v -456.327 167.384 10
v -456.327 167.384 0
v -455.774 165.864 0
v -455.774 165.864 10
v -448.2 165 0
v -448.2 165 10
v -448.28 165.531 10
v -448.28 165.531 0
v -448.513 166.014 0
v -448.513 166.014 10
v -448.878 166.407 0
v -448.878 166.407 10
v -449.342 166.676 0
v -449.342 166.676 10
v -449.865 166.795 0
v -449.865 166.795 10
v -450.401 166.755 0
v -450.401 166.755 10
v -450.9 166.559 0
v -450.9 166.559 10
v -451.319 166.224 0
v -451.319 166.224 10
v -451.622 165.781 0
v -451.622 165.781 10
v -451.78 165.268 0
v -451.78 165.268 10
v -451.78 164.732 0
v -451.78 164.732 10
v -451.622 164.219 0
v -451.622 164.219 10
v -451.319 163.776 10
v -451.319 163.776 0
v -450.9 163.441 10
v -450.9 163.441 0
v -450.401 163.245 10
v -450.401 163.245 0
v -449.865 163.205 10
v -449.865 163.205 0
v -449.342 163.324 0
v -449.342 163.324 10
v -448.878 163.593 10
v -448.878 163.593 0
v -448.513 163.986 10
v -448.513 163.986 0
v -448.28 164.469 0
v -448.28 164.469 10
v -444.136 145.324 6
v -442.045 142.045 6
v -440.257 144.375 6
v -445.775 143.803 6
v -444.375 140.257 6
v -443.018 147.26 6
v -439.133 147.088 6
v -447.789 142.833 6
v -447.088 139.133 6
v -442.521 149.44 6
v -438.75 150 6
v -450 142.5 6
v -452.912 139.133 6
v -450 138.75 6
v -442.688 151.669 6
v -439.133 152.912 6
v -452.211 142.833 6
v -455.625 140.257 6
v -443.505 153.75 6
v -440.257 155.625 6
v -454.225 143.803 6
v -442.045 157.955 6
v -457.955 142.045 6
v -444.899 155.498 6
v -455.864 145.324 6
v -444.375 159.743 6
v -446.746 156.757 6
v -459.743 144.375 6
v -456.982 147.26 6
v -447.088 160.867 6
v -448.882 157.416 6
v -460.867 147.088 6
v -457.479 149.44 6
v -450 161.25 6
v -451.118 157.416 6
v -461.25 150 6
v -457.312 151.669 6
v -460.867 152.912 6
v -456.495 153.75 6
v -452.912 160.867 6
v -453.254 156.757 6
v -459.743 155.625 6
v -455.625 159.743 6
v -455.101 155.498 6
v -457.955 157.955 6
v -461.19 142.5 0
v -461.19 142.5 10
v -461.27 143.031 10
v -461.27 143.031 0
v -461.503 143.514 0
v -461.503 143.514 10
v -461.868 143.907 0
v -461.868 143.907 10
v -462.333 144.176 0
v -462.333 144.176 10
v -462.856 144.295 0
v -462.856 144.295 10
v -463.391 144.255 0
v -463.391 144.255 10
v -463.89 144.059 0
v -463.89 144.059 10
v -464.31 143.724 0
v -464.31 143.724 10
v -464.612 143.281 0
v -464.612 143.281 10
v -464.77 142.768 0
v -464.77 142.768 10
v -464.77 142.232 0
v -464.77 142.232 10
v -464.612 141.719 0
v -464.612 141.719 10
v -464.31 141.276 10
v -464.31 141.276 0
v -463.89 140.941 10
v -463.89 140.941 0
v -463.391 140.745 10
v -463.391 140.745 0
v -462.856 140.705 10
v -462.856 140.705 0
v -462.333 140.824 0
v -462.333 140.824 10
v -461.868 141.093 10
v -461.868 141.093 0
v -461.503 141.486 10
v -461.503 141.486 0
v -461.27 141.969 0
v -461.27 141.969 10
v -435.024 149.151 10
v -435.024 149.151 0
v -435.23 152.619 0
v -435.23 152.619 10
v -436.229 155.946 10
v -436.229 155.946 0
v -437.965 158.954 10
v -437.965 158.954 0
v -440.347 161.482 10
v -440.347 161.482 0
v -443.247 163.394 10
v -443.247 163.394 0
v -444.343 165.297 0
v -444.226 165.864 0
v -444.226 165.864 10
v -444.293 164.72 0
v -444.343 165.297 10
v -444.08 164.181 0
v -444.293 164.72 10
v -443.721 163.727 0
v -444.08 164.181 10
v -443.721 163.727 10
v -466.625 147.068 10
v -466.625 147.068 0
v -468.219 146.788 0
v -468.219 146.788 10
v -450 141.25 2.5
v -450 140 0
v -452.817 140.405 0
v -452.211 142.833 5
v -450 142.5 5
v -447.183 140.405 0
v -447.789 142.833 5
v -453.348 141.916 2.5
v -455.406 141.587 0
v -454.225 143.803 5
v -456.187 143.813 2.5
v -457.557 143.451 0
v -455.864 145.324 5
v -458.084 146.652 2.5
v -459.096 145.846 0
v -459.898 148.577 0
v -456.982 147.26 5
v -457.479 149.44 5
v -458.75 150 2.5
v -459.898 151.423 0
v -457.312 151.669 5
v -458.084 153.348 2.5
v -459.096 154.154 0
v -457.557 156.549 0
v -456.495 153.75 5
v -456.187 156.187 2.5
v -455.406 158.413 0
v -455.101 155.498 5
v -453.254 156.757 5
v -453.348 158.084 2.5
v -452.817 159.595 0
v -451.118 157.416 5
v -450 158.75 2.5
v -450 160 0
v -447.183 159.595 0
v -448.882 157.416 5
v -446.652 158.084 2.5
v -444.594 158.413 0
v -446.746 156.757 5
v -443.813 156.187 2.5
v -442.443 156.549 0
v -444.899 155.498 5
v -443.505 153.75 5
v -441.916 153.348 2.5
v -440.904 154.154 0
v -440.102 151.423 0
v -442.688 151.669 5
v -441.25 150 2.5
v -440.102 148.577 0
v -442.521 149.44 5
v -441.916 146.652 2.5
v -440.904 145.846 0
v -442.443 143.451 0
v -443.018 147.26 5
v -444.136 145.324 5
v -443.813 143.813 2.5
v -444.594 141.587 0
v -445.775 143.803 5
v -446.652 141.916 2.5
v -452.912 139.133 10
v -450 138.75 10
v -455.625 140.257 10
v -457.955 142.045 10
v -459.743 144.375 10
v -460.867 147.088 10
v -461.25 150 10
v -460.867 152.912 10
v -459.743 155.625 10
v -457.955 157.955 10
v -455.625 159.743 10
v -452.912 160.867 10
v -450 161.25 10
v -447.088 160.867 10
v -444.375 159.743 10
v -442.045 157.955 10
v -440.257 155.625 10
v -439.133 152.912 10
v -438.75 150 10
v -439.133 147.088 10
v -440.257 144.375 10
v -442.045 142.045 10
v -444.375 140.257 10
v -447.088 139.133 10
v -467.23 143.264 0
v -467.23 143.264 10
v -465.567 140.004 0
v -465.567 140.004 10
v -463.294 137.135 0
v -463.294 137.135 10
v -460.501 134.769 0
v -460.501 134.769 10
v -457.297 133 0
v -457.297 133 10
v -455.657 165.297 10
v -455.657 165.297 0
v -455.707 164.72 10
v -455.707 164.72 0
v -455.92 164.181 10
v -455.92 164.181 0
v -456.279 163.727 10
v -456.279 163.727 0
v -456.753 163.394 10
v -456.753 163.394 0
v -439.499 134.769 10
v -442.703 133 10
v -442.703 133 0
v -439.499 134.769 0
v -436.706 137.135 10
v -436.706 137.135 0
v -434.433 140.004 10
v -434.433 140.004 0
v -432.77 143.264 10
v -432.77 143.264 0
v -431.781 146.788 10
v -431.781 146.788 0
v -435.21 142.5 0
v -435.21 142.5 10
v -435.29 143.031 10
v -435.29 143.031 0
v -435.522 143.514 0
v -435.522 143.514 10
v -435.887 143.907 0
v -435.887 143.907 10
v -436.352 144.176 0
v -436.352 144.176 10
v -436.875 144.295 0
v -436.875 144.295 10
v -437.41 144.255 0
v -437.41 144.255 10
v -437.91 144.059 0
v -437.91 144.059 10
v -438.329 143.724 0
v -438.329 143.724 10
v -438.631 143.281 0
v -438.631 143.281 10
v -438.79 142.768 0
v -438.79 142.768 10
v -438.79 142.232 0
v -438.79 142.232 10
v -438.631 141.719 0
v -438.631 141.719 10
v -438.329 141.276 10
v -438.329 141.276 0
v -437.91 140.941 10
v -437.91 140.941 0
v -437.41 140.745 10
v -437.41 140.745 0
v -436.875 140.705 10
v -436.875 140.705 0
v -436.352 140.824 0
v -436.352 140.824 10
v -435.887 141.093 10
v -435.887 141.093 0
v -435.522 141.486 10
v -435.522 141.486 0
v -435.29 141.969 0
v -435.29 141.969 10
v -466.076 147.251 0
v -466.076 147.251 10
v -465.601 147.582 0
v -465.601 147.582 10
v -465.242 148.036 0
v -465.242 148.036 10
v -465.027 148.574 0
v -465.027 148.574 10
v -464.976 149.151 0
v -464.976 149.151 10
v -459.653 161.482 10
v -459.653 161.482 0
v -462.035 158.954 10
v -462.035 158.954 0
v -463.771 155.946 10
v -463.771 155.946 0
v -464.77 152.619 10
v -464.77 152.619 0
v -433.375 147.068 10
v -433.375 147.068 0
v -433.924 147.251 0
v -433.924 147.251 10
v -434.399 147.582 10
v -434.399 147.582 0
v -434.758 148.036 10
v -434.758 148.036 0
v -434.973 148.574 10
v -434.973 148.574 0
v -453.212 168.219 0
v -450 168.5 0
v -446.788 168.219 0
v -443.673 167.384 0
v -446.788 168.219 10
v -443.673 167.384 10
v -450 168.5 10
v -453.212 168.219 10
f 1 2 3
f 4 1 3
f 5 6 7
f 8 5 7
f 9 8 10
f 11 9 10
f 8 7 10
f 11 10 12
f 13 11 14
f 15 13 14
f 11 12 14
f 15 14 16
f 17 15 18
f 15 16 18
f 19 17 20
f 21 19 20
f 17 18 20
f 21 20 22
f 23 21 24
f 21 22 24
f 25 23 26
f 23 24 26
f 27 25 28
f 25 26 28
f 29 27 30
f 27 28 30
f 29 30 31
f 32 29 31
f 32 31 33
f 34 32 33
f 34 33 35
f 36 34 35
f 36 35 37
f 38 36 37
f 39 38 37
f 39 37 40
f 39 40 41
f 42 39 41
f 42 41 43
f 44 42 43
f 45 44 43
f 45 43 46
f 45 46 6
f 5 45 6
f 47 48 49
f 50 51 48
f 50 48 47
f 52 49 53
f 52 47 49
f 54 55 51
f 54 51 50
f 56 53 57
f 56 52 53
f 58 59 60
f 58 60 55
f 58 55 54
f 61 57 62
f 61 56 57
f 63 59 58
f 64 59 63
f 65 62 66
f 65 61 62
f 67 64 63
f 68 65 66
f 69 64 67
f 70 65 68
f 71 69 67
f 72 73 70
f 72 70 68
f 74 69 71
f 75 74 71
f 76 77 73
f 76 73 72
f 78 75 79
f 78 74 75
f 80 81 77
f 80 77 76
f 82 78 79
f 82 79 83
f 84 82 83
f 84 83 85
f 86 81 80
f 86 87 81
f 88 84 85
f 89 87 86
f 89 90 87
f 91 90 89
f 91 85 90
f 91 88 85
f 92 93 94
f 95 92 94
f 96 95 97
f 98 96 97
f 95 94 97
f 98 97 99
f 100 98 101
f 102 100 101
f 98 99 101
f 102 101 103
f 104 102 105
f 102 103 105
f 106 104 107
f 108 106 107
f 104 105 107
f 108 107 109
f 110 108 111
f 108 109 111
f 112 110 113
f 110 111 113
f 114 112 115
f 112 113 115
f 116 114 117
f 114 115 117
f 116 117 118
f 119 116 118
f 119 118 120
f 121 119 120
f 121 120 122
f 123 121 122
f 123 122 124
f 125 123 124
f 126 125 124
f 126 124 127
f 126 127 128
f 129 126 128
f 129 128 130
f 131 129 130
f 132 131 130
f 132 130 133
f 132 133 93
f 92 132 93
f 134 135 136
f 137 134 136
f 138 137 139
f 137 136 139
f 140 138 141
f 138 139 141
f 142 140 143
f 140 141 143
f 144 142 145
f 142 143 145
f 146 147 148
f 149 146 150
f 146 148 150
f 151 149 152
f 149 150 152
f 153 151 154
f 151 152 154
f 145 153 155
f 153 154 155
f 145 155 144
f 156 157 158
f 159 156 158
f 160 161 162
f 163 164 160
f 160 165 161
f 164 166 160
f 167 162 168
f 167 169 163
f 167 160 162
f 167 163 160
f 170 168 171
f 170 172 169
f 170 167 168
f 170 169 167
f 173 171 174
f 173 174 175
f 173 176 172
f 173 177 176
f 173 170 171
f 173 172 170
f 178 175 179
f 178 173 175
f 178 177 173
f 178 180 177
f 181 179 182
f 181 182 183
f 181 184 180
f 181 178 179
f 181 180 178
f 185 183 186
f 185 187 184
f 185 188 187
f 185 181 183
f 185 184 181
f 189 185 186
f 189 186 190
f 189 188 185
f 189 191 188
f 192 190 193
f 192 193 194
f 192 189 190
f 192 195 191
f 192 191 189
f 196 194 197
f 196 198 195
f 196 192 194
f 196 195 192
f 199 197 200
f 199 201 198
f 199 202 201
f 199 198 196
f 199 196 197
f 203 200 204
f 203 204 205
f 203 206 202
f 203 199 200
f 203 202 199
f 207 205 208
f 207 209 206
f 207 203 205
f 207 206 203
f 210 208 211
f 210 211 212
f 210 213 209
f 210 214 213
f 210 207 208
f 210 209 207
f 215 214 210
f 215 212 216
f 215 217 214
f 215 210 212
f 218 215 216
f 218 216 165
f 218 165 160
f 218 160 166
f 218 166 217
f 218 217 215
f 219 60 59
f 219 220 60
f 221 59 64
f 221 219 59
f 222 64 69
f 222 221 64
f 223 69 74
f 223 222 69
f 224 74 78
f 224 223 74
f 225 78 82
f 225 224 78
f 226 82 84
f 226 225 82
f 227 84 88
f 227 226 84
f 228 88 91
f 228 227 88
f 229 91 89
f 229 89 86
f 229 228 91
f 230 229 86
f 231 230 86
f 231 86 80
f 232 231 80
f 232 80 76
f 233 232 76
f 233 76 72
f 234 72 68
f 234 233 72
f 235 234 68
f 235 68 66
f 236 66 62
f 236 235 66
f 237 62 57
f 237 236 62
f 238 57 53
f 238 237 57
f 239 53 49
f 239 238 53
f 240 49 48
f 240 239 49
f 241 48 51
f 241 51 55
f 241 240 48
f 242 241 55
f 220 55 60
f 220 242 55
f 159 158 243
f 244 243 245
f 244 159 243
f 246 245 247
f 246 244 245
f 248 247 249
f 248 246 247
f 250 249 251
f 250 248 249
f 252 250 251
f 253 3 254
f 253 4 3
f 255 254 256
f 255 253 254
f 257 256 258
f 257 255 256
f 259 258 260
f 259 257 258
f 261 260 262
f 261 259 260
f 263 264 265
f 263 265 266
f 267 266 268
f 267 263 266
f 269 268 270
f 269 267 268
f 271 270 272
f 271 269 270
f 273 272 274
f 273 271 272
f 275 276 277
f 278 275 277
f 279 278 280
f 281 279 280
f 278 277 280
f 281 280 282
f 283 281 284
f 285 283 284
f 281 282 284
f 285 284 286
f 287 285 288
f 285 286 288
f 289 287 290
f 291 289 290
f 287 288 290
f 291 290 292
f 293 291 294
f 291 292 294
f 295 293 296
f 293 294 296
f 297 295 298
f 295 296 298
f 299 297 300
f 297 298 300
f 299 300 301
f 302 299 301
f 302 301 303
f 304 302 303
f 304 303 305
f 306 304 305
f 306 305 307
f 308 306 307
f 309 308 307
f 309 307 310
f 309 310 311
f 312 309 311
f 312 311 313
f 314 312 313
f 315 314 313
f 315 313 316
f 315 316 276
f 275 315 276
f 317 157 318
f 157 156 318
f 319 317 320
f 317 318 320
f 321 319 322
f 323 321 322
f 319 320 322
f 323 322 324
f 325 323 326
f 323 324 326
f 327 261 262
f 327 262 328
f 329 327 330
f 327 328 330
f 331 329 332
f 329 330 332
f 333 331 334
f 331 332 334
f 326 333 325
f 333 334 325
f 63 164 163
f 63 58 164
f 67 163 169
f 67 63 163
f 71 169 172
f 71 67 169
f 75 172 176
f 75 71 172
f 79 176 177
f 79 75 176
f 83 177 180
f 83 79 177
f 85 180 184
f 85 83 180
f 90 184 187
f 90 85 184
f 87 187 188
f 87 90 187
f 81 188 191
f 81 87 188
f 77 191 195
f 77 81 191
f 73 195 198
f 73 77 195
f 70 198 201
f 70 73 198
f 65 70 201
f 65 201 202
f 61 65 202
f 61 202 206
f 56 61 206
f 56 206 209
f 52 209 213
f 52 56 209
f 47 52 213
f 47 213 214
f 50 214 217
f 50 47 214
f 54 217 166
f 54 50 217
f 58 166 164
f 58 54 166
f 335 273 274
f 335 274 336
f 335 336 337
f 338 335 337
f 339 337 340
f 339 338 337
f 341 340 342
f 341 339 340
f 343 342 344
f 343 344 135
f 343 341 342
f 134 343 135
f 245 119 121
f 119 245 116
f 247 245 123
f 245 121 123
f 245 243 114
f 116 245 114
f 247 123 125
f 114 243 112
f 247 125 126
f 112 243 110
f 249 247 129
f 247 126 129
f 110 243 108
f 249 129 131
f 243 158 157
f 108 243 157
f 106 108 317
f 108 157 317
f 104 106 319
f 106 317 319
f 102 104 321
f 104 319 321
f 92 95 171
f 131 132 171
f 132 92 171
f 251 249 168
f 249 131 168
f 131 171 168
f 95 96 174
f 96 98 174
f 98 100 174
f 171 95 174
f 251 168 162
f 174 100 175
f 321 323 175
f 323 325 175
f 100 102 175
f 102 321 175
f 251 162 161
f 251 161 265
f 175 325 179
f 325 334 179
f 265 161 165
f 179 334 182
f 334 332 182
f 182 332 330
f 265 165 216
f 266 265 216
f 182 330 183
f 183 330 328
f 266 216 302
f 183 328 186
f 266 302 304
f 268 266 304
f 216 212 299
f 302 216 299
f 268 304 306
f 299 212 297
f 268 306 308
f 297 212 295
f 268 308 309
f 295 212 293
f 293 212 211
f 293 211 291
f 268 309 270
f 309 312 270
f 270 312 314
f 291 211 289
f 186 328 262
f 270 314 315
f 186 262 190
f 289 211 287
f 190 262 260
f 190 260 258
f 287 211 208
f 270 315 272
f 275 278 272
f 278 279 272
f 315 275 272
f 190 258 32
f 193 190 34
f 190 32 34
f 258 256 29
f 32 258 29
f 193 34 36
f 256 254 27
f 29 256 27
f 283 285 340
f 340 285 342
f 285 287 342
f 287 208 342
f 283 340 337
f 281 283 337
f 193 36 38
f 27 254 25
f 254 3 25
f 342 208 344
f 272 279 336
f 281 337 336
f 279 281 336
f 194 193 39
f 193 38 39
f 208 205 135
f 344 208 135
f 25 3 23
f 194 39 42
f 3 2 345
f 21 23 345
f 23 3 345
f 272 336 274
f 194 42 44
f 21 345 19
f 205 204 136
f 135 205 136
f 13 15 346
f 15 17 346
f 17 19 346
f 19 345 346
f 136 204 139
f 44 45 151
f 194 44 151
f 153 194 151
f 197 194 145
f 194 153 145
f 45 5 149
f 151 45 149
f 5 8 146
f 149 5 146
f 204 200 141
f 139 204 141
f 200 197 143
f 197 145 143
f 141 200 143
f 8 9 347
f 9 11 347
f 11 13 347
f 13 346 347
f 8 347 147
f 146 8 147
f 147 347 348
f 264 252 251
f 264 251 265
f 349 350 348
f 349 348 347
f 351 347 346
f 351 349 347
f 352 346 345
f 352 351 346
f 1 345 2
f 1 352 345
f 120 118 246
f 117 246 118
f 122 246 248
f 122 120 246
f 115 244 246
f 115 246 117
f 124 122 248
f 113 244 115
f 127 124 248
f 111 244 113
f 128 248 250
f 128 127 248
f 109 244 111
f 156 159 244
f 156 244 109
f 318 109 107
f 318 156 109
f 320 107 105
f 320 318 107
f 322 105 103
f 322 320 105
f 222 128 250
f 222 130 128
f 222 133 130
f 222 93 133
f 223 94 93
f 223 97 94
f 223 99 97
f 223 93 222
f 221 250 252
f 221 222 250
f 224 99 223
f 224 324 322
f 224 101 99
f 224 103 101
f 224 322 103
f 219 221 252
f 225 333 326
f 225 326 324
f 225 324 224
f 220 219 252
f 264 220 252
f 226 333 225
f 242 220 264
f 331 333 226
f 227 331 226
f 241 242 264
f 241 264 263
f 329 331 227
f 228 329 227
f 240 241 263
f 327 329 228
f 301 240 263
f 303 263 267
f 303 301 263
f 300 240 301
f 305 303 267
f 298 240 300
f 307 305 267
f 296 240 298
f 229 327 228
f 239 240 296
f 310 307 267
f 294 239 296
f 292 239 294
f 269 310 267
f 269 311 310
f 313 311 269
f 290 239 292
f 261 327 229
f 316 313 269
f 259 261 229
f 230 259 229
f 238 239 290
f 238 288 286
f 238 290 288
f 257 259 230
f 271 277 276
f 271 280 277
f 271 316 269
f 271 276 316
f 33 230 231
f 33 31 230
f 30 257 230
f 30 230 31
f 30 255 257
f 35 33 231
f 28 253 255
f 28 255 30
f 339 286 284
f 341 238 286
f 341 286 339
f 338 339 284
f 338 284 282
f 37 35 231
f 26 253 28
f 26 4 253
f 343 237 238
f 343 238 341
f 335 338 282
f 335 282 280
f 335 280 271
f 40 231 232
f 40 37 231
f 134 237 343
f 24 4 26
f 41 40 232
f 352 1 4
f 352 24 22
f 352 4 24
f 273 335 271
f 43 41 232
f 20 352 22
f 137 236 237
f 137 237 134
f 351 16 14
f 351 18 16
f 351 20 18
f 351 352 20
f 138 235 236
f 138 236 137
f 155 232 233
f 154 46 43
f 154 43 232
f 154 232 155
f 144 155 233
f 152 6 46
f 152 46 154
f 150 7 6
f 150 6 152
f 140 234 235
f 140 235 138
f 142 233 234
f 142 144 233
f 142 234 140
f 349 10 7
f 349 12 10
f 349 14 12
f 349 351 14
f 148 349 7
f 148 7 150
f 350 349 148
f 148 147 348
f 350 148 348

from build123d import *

# Parameters (mm, degrees)
EXTRUDE_1_DEPTH             = 10
CUT_EXTRUDE_1_DEPTH         = 11
CUT_EXTRUDE_2_DEPTH         = 11
HOLE_WIZARD_3_6_3_6_1_D     = 3.6
HOLE_WIZARD_3_6_3_6_1_DEPTH = 10
FILLET_1_R                  = 2


with BuildPart() as part:
    # 草图1 → 凸台-拉伸1 (new body)
    with BuildSketch(Plane.XY.offset(10)):
        with BuildLine():
            Line((-457.29725976, 133), (-442.70274024, 133))
            ThreePointArc((-442.70274024, 133), (-450, 168.5), (-457.29725976, 133))
        make_face()
    extrude(amount=-EXTRUDE_1_DEPTH)

    # 草图2 → 切除-拉伸1 (cut, through all)
    with BuildSketch(Plane(origin=(0, 0, 0), x_dir=(-1, 0, 0), z_dir=(0, 0, -1))):
        with BuildLine():
            Line((431.781056569, 146.787508713), (435.227883705, 147.395277335))
            ThreePointArc((435.227883705, 147.395277335), (437.009618943, 157.5), (444.86969785, 164.095389312))
            Line((444.86969785, 164.095389312), (443.672627348, 167.384313485))
            ThreePointArc((443.672627348, 167.384313485), (433.97853003, 159.25), (431.781056569, 146.787508713))
        make_face()
    extrude(amount=-CUT_EXTRUDE_1_DEPTH, mode=Mode.SUBTRACT)

    # 草图3 → 切除-拉伸2 (cut, through all)
    with BuildSketch(Plane(origin=(0, 0, 0), x_dir=(-1, 0, 0), z_dir=(0, 0, -1))):
        with BuildLine():
            Line((456.327372652, 167.384313485), (455.13030215, 164.095389312))
            ThreePointArc((455.13030215, 164.095389312), (462.990381057, 157.5), (464.772116295, 147.395277335))
            Line((464.772116295, 147.395277335), (468.218943431, 146.787508713))
            ThreePointArc((468.218943431, 146.787508713), (466.02146997, 159.25), (456.327372652, 167.384313485))
        make_face()
    extrude(amount=-CUT_EXTRUDE_2_DEPTH, mode=Mode.SUBTRACT)

    # Ø3.6 (3.6) 直径孔1
    with Locations(Plane(origin=(0, 0, 0), x_dir=(-1, 0, 0), z_dir=(0, 0, -1))):
        with Locations((437.009618943, 142.5), (450, 165), (462.990381057, 142.5)):
            Hole(HOLE_WIZARD_3_6_3_6_1_D / 2, depth=HOLE_WIZARD_3_6_3_6_1_DEPTH)

    # 草图6 → M12 六角头螺栓的柱形沉头孔1 (revolve, cut)
    with BuildSketch(Plane(origin=(-450, 150, 10), x_dir=(0, -1, 0), z_dir=(1, 0, 0))):
        Polygon((0, 0), (0, 10), (10, 10), (7.5, 5), (7.5, 4), (11.25, 4), (11.25, 0), align=None)
    revolve(axis=Axis((-450, 150, 16.35), (0, 0, -1)), mode=Mode.SUBTRACT)

    # 圆角1
    fillet_1_edges = [part.edges().sort_by_distance(p)[0] for p in [
        (-444.86969785, 164.095389312, 5),
        (-435.227883705, 147.395277335, 5),
        (-464.772116295, 147.395277335, 5),
        (-455.13030215, 164.095389312, 5),
    ]]
    fillet(fillet_1_edges, radius=FILLET_1_R)


solid = part.part
